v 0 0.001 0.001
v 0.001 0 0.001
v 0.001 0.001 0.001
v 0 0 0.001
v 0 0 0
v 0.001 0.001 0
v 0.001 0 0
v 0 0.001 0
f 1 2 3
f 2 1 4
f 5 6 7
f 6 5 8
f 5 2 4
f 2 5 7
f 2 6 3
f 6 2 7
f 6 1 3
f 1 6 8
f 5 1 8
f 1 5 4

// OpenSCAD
// t_turtle — THE FALSIFICATION TEST for the two-level IR (ADR 0002).
//
// The rule, stated in advance: if the turtle does not fall out of the spine
// cleanly -- if the spine has to grow a case, or the turtle reimplements any
// frame or tessellation logic -- the spine layer gets DELETED in favour of a
// bare station list, not defended.
//
// It fell out cleanly. No core module changed, and neither new frontend
// references ut_fragments, ut_ref_fallback, ut_ortho or ut_stations at all.

use <../src/uniTube.scad>;

// ============================================ hand-verified geometry
// start [0,0,0], dir +X, up +Z:
//   feed 60      -> [60,0,0]
//   bend 90 r24  -> centre [60,0,24], end [84,0,24], dir +Z, up -X
//   feed 40      -> [84,0,64]
//   roll 90      -> up = -Y   (NO geometry emitted)
//   bend 45 r24  -> centre [84,-24,64], end [84,-7.0294,80.9706]
//   feed 30      -> [84,-28.2426407,102.1837662]
p = ut_turtle(
    [
        ["feed", 60],
        ["bend", 90, "r", 24],
        ["feed", 40],
        ["roll", 90],
        ["bend", 45, "r", 24],
        ["feed", 30],
    ]
);

segs = ut_segs(p);
assert(len(segs) == 5, str("expected L,A,L,A,L -- got ", len(segs), " segments"));
assert([for (s = segs) ut_seg_kind(s)] == ["L", "A", "L", "A", "L"], "roll emits NO segment of its own");

// Exact developed length: 60 + quarter-arc(24) + 40 + eighth-arc(24) + 30.
expect_len = 60 + (90 / 360) * 2 * PI * 24 + 40 + (45 / 360) * 2 * PI * 24 + 30;
assert(abs(ut_length(p) - expect_len) < 1e-9, str("developed length ", ut_length(p), " != ", expect_len));

// The end point, hand-derived above.
sts = ut_stations(p);
endp = ut_st_p(sts[len(sts) - 1]);
assert(norm(endp - [84, -28.2426406871, 102.1837661841]) < 1e-6, str("end point ", endp));

// The first bend's arc, verifiable by hand with no rendering.
a1 = segs[1];
assert(norm(a1[1] - [60, 0, 24]) < 1e-9, "first arc centre is r along `up` from the bend point");
assert(norm(ut_seg_t0(a1) - [1, 0, 0]) < 1e-9, "arc enters along the incoming heading");
assert(norm(ut_seg_t1(a1) - [0, 0, 1]) < 1e-9, "and leaves bent 90 degrees toward `up`");

// ============================================ roll changes the PATH, not the IR
// Same commands without the roll: the second bend stays in the first plane, so
// the part is a different SHAPE -- but the spine still carries no roll field.
flat = ut_turtle([["feed", 60], ["bend", 90, "r", 24], ["feed", 40], ["bend", 45, "r", 24], ["feed", 30]]);
assert(abs(ut_length(flat) - ut_length(p)) < 1e-9, "roll costs no length");
assert(
    norm(ut_st_p(ut_stations(flat)[len(ut_stations(flat)) - 1]) - endp) > 1,
    "but it genuinely moves the end of the path -- roll is geometry, consumed by the frontend"
);
// SPINE-5: nothing in either spine records a roll.
assert(len(ut_segs(p)[1]) == 6, "an arc is [kind, c, u, v, r, ang] -- six fields, none of them roll");

// ============================================ bends over 180 degrees are SPLIT
// SPINE-4 caps one arc at 180 so the tangent sign can never be ambiguous.
// Splitting is the FRONTEND's job; the spine does not grow a case for it.
coil = ut_turtle([["feed", 10], ["bend", 270, "r", 20], ["feed", 10]]);
arcs = [for (s = ut_segs(coil)) if (ut_seg_kind(s) == "A") s];
assert(len(arcs) == 2, str("a 270 degree bend splits into 2 arcs, got ", len(arcs)));
assert(max([for (s = arcs) s[5]]) <= 180 + 1e-9, "and neither exceeds 180");
assert(abs(ut_length(coil) - (10 + (270 / 360) * 2 * PI * 20 + 10)) < 1e-9, "the split preserves total length");

// The split rebuilds the command list around the bend, and BOTH slices used to
// be unguarded. OpenSCAD silently reverses a descending range -- [0:-1] is
// [-1, 0] -- so a >180 bend as the FIRST or LAST command spliced garbage into
// the program and aborted with `unknown command "undef"`, naming the wrong
// cause. Neither boundary was covered: the case above has commands on both sides.
first = ut_turtle([["bend", 270, "r", 30], ["feed", 20]]);
assert(
    abs(ut_length(first) - ( (270 / 360) * 2 * PI * 30 + 20)) < 1e-9,
    "a >180 bend as the FIRST command splits correctly"
);
last = ut_turtle([["feed", 20], ["bend", 270, "r", 30]]);
assert(
    abs(ut_length(last) - (20 + (270 / 360) * 2 * PI * 30)) < 1e-9,
    "a >180 bend as the LAST command splits correctly"
);
// Repeated halving: 400 degrees needs two rounds, because 200 is still over 180.
big = ut_turtle([["bend", 400, "r", 40]]);
bigarcs = [for (s = ut_segs(big)) if (ut_seg_kind(s) == "A") s];
assert(len(bigarcs) == 4, str("400 degrees halves twice, into 4 arcs, got ", len(bigarcs)));
assert(abs(ut_length(big) - (400 / 360) * 2 * PI * 40) < 1e-9, "and still preserves total length");

// ============================================ negative bends go the other way
down = ut_turtle([["feed", 20], ["bend", -90, "r", 15], ["feed", 20]]);
dsts = ut_stations(down);
assert(ut_st_p(dsts[len(dsts) - 1])[2] < -1, "a negative bend curves AWAY from `up`");

// ============================================ frames still work over a turtle path
assert(max([for (s = sts) abs(ut_st_t(s) * ut_st_n(s))]) < 1e-9, "frames stay orthonormal over a turtle path");
assert(abs(ut_st_s(sts[len(sts) - 1]) - ut_length(p)) < 1e-6, "arclength closes");

cube(0.001); // sentinel
